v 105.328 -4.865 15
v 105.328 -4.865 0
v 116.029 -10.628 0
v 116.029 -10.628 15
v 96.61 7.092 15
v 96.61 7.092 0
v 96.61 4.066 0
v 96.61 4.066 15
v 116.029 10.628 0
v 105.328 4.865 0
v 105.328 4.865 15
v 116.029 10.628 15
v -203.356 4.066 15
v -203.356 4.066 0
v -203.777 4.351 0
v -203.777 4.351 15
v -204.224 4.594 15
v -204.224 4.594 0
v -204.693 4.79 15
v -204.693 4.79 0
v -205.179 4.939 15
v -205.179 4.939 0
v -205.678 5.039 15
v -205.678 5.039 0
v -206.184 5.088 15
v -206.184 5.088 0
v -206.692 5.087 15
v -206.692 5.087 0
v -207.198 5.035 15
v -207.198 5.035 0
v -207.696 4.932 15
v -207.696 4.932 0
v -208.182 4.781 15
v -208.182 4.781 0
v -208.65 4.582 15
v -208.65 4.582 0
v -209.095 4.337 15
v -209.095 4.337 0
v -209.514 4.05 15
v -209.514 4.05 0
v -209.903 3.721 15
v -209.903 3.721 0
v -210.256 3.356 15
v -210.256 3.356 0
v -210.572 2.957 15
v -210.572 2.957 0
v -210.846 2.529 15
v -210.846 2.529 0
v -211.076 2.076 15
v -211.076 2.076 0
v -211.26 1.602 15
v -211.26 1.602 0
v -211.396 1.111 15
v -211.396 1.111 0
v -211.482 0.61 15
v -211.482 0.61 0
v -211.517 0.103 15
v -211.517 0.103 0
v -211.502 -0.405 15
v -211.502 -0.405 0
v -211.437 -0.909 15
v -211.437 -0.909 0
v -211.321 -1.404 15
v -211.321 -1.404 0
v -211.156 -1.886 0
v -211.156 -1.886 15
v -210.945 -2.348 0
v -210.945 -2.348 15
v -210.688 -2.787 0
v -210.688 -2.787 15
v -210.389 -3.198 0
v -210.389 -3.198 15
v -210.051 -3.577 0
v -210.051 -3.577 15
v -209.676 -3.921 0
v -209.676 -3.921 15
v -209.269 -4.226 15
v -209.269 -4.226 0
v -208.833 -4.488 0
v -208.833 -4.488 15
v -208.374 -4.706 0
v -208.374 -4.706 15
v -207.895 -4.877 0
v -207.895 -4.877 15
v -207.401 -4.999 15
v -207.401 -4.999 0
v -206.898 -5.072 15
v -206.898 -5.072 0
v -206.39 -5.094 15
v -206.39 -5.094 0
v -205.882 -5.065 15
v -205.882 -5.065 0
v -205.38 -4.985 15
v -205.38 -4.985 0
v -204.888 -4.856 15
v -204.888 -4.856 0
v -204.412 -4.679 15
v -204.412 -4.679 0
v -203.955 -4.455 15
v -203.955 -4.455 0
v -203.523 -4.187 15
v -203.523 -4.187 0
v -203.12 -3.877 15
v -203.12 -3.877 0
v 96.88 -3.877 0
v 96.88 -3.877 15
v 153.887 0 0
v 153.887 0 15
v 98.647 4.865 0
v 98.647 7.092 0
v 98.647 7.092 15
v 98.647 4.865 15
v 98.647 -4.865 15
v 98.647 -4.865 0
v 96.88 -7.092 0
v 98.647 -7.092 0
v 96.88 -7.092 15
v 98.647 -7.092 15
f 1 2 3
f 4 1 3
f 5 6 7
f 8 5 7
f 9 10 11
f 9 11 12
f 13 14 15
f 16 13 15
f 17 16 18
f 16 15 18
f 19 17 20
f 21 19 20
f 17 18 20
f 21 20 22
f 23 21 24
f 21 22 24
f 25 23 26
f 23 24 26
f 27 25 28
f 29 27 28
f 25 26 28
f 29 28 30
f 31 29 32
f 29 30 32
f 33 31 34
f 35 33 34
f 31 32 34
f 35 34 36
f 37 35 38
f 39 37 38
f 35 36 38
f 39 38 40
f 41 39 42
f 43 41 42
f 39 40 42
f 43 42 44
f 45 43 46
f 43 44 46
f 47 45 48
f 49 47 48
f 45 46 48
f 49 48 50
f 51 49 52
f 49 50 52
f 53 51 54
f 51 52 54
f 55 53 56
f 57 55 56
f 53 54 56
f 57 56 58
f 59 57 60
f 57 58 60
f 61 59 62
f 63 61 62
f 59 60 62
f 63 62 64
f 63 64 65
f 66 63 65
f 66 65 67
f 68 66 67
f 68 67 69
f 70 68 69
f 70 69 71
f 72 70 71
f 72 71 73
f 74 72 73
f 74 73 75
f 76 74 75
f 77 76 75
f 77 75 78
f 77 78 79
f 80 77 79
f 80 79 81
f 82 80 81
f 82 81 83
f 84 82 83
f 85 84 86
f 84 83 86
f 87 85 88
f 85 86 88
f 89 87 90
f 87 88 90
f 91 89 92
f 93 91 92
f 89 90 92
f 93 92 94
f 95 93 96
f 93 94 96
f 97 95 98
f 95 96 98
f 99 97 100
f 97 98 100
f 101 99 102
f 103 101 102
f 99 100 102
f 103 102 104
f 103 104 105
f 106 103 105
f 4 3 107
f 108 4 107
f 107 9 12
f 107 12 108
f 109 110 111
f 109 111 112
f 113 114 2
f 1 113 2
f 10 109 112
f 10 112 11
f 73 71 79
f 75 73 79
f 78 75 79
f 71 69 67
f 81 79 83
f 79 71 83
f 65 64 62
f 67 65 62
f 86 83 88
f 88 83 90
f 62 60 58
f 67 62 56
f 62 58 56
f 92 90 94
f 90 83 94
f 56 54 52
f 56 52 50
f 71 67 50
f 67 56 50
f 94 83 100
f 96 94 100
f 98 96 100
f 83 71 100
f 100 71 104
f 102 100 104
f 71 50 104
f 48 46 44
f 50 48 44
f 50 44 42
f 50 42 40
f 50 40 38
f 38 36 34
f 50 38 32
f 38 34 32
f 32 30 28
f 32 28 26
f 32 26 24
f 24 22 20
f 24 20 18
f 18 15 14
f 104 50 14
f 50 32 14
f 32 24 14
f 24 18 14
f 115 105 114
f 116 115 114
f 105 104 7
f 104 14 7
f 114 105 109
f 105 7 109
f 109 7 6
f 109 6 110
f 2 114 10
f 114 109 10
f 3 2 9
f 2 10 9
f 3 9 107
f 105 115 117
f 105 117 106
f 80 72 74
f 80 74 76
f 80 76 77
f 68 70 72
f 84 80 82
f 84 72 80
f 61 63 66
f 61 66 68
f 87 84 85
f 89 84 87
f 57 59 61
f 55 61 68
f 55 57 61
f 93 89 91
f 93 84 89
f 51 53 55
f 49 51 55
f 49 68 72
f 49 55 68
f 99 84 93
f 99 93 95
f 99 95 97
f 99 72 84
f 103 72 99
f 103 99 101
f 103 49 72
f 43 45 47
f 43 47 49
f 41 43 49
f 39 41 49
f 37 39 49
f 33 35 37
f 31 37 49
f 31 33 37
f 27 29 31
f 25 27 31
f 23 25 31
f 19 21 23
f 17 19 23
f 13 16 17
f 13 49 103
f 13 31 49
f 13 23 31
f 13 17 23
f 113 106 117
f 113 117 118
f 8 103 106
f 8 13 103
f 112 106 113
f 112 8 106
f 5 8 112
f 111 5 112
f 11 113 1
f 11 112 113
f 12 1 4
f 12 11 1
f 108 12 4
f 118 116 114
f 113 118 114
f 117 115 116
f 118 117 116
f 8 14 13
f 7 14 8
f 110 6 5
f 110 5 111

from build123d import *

# Parameters (mm, degrees)
PAD_DEPTH = 15


with BuildPart() as part:
    # Sketch001 → Pad (new body)
    with BuildSketch(Plane.XY):
        with BuildLine():
            Line((-203.120468, -3.876596), (96.879532, -3.876596))
            Line((96.879532, -7.091605), (96.879532, -3.876596))
            Line((96.879532, -7.091605), (98.646553, -7.091605))
            Line((98.646553, -7.091605), (98.646553, -4.864568))
            Line((98.646553, -4.864568), (105.327652, -4.864568))
            Line((105.327652, -4.864568), (116.029373, -10.627858))
            Line((116.029373, -10.627858), (153.887405, 0))
            Line((116.029373, 10.627858), (153.887405, 0))
            Line((105.327652, 4.864568), (116.029373, 10.627858))
            Line((98.646553, 4.864568), (105.327652, 4.864568))
            Line((98.646553, 7.091605), (98.646553, 4.864568))
            Line((96.609558, 7.091605), (98.646553, 7.091605))
            Line((96.609558, 7.091605), (96.609558, 4.065819))
            Line((-203.356306, 4.065819), (96.609558, 4.065819))
            ThreePointArc((-203.356306, 4.065819), (-211.516091, -0.151182), (-203.120468, -3.876596))
        make_face()
    extrude(amount=PAD_DEPTH)


solid = part.part
